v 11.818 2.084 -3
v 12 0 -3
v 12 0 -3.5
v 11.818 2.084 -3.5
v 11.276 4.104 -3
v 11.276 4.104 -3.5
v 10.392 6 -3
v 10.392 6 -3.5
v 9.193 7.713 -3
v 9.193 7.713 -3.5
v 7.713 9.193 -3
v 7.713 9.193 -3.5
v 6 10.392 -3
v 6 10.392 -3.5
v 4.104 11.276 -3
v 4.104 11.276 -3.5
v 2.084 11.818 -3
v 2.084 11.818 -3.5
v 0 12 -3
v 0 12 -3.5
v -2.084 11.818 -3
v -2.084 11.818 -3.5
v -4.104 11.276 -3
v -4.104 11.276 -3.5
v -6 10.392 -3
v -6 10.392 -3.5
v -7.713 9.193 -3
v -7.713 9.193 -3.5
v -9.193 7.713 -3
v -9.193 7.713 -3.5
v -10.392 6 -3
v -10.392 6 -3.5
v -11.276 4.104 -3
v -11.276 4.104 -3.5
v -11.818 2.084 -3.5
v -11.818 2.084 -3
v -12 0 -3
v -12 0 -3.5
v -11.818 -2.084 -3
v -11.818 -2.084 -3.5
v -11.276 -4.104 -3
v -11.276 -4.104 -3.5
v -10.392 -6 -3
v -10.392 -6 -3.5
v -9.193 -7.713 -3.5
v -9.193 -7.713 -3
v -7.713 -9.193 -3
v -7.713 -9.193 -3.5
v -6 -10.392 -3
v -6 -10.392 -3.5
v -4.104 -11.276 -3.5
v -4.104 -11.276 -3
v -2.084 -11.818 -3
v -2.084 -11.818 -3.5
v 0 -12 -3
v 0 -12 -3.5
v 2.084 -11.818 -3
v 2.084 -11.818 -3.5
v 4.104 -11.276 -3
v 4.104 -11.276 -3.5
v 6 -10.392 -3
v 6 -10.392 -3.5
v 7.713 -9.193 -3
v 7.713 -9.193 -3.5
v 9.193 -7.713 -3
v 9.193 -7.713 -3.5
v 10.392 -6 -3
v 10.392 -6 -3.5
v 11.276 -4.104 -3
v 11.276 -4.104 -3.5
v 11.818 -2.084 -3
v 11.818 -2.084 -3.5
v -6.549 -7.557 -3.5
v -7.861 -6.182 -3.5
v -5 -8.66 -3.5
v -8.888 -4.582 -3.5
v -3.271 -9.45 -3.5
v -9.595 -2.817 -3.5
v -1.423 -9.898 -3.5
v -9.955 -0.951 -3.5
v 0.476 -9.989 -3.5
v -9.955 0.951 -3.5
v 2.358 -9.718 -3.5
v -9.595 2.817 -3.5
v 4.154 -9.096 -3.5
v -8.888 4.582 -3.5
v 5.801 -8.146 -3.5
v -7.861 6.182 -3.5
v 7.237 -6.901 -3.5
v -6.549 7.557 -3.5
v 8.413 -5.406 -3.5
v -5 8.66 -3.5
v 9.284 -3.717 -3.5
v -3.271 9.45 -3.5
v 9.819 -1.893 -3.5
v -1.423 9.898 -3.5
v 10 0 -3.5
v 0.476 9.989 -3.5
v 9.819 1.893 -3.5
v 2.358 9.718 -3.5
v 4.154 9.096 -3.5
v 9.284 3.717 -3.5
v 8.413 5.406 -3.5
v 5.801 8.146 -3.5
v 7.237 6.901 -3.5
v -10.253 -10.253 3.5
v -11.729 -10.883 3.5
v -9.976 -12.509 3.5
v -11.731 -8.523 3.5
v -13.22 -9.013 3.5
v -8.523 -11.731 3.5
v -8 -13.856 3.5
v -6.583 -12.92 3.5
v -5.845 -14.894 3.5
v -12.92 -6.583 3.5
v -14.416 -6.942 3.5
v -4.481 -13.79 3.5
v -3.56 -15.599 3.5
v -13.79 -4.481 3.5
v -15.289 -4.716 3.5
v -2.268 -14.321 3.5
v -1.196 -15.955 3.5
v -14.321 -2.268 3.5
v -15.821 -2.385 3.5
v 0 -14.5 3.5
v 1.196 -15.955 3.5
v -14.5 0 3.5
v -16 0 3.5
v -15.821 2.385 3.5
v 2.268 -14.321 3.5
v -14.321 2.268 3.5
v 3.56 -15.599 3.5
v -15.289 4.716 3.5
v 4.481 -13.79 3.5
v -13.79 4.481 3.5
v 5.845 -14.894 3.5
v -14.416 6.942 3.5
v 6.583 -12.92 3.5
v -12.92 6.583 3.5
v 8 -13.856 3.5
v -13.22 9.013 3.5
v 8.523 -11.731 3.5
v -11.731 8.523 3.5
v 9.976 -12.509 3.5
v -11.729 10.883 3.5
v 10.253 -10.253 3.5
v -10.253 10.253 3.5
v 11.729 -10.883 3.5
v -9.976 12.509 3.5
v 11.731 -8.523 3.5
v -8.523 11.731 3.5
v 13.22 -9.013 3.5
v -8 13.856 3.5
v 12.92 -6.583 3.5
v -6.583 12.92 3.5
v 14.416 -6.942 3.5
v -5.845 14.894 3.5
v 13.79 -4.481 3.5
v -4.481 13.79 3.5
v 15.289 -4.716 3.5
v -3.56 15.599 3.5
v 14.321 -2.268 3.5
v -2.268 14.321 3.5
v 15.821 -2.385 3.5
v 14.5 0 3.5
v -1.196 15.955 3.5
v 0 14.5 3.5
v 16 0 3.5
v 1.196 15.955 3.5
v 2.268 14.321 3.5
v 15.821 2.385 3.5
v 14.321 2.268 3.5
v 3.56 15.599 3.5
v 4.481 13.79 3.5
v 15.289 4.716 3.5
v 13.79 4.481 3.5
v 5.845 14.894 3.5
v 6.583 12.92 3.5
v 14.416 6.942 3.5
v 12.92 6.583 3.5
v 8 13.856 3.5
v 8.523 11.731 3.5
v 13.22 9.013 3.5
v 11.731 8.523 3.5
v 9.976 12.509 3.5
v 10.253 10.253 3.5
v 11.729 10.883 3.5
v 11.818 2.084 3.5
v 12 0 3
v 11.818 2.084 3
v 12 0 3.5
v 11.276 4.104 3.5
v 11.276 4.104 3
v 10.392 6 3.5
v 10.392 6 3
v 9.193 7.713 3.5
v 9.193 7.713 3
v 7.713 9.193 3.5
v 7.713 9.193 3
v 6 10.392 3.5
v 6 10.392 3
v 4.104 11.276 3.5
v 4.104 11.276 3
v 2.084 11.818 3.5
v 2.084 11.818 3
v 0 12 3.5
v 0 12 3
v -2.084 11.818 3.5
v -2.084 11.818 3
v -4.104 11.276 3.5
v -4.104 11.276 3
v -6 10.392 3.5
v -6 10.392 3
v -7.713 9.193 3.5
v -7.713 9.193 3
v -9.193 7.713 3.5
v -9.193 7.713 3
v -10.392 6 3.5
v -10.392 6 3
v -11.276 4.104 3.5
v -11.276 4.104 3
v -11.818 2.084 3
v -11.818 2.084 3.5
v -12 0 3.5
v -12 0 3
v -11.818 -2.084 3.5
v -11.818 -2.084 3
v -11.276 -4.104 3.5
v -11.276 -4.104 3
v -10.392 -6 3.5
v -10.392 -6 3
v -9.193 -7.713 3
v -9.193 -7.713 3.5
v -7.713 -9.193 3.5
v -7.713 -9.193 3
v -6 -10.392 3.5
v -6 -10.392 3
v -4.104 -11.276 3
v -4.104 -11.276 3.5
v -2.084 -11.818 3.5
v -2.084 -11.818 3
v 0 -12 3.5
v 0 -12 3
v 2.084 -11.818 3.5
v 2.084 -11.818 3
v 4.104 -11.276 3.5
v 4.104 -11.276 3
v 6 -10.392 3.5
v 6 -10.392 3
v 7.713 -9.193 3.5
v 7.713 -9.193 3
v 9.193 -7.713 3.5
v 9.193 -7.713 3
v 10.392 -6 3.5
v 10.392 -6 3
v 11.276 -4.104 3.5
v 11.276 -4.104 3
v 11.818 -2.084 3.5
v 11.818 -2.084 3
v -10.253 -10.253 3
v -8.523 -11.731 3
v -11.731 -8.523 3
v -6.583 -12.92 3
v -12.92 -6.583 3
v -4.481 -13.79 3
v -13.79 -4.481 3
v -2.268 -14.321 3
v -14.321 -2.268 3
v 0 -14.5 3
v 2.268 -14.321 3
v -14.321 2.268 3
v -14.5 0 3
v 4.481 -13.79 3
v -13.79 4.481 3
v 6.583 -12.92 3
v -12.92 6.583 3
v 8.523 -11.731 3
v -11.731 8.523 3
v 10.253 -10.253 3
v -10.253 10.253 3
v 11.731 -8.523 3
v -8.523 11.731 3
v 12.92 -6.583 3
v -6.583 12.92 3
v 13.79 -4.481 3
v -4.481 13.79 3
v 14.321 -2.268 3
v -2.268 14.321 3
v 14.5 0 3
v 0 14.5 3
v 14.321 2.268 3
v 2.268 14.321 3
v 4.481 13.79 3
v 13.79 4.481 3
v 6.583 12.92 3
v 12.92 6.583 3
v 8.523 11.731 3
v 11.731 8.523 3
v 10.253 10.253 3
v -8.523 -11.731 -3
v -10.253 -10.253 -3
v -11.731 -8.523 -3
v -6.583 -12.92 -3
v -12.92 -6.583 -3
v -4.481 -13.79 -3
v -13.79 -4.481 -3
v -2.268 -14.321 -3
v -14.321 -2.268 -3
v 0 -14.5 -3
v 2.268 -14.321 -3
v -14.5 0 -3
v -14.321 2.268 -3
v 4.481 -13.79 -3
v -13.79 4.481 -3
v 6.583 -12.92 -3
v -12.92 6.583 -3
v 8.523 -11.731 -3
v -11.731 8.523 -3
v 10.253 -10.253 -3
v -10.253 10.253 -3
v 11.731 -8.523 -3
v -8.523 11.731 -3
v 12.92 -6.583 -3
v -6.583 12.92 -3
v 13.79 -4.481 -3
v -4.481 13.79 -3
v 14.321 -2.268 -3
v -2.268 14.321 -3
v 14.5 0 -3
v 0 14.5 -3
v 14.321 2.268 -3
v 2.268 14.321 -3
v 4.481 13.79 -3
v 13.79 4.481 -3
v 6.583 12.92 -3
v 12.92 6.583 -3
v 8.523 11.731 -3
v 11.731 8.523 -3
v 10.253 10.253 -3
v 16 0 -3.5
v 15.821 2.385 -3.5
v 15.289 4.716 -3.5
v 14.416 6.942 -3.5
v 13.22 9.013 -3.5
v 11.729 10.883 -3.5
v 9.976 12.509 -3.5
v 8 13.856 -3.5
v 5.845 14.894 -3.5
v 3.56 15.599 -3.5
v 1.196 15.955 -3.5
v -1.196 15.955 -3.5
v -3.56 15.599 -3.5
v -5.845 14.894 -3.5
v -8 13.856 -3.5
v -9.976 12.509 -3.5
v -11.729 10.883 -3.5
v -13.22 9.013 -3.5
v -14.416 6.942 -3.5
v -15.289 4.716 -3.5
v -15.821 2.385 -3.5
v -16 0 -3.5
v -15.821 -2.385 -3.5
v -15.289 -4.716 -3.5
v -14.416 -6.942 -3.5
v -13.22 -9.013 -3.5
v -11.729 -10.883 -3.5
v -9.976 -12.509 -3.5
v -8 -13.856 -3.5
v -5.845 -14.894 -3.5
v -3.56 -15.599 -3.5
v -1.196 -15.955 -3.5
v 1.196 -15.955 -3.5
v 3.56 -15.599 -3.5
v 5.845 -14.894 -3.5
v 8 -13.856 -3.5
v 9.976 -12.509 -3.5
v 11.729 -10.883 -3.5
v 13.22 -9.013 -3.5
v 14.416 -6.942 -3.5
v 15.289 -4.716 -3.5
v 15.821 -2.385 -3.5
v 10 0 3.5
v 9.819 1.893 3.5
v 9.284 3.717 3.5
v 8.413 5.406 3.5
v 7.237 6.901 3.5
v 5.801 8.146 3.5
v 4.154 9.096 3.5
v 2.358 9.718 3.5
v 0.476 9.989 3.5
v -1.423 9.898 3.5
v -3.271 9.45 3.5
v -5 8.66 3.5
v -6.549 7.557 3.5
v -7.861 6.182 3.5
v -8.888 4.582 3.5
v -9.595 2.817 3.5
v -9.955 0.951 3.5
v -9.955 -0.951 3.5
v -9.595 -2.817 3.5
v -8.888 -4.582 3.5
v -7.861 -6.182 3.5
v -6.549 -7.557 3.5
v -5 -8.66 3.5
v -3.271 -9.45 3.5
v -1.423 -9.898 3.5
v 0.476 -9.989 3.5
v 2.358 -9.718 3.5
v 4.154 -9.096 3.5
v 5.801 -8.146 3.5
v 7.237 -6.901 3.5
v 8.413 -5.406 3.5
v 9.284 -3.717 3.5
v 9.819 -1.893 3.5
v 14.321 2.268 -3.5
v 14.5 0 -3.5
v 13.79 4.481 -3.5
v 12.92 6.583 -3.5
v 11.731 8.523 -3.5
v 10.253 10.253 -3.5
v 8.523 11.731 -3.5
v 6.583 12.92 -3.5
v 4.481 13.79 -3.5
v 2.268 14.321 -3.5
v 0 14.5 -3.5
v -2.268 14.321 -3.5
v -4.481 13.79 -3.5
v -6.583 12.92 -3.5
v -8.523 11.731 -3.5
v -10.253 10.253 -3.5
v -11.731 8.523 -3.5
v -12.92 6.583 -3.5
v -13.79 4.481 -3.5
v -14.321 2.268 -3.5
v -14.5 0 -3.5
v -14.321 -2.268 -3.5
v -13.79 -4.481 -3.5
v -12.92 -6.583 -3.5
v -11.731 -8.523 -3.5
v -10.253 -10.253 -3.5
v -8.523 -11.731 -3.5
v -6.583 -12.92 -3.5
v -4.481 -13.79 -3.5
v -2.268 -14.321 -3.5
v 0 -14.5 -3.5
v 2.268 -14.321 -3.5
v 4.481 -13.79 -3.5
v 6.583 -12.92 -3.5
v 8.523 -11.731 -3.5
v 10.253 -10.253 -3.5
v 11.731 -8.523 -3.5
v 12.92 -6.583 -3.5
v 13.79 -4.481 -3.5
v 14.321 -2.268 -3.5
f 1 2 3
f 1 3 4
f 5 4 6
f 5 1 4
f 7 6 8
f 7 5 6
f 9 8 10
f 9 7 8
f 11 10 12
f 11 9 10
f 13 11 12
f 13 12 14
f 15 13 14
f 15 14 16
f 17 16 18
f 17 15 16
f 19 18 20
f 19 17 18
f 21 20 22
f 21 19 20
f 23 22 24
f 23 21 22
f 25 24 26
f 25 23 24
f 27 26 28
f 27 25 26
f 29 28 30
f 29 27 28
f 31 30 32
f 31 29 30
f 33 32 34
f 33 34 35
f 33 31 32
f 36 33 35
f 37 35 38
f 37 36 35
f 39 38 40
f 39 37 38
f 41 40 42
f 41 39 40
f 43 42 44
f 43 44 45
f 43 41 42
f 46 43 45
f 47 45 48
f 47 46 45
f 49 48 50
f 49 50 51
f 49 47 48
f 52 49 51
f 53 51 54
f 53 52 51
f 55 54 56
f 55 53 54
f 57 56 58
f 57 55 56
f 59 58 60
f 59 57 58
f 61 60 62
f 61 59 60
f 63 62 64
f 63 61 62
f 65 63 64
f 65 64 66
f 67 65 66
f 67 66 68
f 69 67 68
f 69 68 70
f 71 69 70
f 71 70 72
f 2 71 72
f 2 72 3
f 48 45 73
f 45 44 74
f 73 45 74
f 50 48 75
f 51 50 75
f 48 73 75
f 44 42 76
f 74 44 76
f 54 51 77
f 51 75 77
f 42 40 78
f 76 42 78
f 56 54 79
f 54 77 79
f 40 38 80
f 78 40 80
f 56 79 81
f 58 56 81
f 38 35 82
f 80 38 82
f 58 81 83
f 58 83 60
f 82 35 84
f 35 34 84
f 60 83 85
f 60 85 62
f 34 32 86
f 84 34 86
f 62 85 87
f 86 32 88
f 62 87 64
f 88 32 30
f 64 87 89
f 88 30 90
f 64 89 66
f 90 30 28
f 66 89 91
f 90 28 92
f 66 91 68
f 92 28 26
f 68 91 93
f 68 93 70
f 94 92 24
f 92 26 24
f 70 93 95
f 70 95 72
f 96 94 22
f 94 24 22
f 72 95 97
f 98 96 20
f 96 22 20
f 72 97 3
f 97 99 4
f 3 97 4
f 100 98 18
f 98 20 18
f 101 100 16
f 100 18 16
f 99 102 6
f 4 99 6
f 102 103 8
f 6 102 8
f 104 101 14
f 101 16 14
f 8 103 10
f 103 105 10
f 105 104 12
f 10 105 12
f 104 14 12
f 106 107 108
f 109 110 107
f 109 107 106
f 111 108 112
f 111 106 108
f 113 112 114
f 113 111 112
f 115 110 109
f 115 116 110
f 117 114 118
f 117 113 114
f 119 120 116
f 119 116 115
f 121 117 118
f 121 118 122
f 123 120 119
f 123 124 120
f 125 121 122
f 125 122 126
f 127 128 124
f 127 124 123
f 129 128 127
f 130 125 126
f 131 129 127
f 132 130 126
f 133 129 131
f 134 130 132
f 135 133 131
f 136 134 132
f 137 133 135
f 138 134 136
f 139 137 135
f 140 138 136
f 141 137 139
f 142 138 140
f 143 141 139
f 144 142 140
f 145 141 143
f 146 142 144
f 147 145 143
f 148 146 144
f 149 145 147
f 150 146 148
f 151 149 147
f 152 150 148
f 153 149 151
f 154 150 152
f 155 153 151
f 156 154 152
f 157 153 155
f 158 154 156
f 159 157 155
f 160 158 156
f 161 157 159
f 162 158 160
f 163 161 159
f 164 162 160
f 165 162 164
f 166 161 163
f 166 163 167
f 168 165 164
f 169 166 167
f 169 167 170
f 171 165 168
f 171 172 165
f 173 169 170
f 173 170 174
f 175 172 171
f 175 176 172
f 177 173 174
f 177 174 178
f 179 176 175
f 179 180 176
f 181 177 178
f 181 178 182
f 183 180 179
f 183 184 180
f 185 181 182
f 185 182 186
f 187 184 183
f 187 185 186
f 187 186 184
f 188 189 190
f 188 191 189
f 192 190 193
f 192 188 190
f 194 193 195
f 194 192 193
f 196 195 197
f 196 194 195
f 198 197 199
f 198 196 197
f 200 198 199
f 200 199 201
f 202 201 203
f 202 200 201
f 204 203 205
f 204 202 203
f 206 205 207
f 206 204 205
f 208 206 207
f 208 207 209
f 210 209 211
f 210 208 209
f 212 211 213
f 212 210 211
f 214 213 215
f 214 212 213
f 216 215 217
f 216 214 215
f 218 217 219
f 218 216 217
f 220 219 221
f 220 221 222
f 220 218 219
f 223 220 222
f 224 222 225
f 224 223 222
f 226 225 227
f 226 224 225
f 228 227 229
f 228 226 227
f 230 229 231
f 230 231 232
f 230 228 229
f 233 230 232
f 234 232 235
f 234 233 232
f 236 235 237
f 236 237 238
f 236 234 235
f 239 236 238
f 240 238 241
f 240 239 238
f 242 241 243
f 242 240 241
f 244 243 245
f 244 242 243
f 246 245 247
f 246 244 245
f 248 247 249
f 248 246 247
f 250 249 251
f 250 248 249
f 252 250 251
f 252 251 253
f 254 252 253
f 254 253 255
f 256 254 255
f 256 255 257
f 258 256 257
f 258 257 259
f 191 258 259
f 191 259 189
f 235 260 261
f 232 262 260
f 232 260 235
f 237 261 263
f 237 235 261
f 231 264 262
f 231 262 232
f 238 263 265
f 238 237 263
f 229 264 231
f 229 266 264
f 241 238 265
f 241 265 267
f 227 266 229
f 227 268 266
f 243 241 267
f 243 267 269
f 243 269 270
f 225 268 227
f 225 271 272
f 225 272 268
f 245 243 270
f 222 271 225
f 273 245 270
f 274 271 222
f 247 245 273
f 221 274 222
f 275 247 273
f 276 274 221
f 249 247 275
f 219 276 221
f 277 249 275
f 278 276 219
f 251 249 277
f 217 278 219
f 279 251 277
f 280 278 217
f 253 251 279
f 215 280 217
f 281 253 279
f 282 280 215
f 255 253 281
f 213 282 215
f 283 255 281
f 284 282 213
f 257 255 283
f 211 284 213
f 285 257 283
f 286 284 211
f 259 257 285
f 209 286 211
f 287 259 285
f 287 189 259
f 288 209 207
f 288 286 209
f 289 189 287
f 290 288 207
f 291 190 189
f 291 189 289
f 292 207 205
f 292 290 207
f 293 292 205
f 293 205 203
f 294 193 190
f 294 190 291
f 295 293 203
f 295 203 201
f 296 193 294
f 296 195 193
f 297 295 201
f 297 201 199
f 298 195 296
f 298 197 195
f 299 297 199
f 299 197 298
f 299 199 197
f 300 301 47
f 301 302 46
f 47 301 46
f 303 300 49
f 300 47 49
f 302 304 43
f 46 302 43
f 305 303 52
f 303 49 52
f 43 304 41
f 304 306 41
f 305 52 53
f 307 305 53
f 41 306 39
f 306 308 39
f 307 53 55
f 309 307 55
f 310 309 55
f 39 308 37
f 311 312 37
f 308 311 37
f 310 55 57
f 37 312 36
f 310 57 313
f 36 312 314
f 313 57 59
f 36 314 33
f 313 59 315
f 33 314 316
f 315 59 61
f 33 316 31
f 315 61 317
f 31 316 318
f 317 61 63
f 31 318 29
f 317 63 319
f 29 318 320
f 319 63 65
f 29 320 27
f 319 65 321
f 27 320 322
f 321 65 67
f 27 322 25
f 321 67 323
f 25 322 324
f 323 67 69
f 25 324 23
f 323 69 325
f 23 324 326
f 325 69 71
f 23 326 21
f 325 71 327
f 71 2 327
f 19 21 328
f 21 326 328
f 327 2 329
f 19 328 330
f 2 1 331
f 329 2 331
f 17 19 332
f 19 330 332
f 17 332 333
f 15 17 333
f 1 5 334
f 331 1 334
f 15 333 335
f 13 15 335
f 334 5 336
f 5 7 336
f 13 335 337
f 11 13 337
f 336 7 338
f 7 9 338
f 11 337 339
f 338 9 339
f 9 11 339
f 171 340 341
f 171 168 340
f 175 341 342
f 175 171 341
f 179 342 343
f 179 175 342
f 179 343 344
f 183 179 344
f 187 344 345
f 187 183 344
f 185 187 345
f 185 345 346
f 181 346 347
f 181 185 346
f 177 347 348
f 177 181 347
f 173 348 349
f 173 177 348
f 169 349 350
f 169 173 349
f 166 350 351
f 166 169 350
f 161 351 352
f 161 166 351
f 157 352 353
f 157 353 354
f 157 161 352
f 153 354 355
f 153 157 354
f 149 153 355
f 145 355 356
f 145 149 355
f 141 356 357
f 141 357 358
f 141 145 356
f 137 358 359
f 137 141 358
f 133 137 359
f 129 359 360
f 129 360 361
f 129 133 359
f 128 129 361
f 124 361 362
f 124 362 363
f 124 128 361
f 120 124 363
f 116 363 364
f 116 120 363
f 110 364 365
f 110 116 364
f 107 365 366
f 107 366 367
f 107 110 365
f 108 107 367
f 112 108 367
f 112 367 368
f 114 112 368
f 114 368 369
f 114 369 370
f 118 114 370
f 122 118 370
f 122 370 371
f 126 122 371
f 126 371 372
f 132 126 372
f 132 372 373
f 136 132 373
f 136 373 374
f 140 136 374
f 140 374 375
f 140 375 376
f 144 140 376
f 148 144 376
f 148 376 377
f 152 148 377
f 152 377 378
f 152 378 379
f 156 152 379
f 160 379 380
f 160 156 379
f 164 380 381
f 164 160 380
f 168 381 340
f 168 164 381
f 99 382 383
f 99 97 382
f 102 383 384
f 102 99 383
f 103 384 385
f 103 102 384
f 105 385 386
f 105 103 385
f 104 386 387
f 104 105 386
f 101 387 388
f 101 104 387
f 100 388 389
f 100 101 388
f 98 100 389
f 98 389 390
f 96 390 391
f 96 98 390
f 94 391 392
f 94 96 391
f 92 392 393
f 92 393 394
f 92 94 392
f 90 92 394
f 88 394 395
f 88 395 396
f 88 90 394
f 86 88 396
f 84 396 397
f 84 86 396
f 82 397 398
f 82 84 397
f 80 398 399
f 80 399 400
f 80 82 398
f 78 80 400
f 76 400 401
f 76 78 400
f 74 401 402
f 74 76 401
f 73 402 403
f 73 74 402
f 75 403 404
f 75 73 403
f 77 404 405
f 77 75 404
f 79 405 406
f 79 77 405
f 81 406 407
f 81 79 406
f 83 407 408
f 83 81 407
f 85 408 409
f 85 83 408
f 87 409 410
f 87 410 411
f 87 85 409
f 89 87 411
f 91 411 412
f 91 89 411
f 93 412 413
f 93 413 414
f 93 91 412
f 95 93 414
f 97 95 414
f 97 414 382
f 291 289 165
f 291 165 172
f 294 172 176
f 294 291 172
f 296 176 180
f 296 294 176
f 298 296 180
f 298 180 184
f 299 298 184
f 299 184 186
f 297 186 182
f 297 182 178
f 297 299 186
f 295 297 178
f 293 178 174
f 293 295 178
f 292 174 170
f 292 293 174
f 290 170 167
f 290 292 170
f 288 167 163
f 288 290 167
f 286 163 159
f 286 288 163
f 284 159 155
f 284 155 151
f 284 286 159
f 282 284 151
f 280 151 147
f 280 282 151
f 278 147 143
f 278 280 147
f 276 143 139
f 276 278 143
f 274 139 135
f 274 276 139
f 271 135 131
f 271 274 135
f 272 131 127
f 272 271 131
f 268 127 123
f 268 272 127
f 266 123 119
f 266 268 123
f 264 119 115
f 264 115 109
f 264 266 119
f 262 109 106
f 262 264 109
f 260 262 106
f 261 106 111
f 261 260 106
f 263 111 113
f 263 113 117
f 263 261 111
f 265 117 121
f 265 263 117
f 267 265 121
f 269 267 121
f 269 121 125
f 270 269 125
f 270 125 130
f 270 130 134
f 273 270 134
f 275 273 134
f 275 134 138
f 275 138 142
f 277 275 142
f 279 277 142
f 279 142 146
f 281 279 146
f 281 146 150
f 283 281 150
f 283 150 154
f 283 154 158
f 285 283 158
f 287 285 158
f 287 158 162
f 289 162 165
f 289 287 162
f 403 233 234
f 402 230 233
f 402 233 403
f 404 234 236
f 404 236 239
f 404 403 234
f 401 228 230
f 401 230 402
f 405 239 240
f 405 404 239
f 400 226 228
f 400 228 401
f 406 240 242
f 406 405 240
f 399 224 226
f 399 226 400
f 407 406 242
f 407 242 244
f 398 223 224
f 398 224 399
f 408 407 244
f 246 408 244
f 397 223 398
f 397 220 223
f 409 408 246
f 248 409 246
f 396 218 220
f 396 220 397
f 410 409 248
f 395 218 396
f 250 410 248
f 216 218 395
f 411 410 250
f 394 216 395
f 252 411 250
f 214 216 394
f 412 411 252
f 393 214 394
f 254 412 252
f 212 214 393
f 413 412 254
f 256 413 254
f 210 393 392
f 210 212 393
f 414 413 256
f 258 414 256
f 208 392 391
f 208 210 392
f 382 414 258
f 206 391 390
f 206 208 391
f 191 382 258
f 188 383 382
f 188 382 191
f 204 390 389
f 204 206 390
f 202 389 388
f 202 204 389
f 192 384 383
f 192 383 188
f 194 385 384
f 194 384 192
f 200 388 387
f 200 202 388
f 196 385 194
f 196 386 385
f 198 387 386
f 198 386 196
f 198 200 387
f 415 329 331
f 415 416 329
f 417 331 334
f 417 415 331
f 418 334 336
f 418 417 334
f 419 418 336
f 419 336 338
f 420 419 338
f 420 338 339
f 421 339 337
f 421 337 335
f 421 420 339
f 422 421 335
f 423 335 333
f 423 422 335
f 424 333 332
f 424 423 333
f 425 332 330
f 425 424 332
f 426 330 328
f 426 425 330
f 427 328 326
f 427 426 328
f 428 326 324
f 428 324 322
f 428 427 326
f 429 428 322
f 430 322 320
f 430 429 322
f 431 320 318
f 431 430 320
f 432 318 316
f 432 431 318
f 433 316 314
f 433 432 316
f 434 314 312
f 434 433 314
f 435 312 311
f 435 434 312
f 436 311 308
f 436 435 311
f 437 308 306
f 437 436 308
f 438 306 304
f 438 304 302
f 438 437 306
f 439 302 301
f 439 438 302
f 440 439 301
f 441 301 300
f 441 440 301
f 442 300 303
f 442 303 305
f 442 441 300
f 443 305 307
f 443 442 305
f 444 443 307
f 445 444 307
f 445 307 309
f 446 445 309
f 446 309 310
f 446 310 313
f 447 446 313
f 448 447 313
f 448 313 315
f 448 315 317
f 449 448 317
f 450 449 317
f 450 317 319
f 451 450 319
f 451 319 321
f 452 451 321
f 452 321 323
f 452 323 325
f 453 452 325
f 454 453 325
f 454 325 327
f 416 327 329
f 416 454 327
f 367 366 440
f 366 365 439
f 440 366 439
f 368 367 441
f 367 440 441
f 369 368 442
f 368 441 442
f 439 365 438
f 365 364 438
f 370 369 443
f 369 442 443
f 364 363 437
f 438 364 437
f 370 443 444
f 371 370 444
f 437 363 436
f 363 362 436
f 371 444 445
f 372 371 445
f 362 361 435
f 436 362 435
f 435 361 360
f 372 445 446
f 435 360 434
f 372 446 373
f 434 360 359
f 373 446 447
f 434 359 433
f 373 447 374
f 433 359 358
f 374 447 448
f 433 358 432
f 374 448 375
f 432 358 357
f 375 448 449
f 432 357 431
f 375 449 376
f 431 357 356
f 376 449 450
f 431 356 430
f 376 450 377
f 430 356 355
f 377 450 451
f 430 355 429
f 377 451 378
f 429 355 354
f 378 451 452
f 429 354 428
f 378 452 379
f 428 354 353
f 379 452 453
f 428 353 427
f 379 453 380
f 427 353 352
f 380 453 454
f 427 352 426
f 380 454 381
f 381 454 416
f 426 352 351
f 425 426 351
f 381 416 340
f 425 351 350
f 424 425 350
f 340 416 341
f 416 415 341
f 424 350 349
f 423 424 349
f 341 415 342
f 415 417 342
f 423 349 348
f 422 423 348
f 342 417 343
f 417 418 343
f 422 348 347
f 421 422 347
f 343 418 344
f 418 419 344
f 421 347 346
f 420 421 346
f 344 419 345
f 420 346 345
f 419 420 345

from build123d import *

# Parameters (mm, degrees)
SKETCH_R      = 16
SKETCH_R_2    = 14.5
PAD_DEPTH     = 3.5
SKETCH001_R   = 14.5
SKETCH001_R_2 = 12
PAD001_DEPTH  = 3
SKETCH002_R   = 12
SKETCH002_R_2 = 10
PAD002_DEPTH  = 3.5


with BuildPart() as part:
    # Sketch → Pad (new body, symmetric)
    with BuildSketch(Plane.XY):
        Circle(SKETCH_R)
        Circle(SKETCH_R_2, mode=Mode.SUBTRACT)
    extrude(amount=PAD_DEPTH, both=True)

    # Sketch001 → Pad001 (join, symmetric)
    with BuildSketch(Plane.XY):
        Circle(SKETCH001_R)
        Circle(SKETCH001_R_2, mode=Mode.SUBTRACT)
    extrude(amount=PAD001_DEPTH, both=True)

    # Sketch002 → Pad002 (join, symmetric)
    with BuildSketch(Plane.XY):
        Circle(SKETCH002_R)
        Circle(SKETCH002_R_2, mode=Mode.SUBTRACT)
    extrude(amount=PAD002_DEPTH, both=True)


solid = part.part
